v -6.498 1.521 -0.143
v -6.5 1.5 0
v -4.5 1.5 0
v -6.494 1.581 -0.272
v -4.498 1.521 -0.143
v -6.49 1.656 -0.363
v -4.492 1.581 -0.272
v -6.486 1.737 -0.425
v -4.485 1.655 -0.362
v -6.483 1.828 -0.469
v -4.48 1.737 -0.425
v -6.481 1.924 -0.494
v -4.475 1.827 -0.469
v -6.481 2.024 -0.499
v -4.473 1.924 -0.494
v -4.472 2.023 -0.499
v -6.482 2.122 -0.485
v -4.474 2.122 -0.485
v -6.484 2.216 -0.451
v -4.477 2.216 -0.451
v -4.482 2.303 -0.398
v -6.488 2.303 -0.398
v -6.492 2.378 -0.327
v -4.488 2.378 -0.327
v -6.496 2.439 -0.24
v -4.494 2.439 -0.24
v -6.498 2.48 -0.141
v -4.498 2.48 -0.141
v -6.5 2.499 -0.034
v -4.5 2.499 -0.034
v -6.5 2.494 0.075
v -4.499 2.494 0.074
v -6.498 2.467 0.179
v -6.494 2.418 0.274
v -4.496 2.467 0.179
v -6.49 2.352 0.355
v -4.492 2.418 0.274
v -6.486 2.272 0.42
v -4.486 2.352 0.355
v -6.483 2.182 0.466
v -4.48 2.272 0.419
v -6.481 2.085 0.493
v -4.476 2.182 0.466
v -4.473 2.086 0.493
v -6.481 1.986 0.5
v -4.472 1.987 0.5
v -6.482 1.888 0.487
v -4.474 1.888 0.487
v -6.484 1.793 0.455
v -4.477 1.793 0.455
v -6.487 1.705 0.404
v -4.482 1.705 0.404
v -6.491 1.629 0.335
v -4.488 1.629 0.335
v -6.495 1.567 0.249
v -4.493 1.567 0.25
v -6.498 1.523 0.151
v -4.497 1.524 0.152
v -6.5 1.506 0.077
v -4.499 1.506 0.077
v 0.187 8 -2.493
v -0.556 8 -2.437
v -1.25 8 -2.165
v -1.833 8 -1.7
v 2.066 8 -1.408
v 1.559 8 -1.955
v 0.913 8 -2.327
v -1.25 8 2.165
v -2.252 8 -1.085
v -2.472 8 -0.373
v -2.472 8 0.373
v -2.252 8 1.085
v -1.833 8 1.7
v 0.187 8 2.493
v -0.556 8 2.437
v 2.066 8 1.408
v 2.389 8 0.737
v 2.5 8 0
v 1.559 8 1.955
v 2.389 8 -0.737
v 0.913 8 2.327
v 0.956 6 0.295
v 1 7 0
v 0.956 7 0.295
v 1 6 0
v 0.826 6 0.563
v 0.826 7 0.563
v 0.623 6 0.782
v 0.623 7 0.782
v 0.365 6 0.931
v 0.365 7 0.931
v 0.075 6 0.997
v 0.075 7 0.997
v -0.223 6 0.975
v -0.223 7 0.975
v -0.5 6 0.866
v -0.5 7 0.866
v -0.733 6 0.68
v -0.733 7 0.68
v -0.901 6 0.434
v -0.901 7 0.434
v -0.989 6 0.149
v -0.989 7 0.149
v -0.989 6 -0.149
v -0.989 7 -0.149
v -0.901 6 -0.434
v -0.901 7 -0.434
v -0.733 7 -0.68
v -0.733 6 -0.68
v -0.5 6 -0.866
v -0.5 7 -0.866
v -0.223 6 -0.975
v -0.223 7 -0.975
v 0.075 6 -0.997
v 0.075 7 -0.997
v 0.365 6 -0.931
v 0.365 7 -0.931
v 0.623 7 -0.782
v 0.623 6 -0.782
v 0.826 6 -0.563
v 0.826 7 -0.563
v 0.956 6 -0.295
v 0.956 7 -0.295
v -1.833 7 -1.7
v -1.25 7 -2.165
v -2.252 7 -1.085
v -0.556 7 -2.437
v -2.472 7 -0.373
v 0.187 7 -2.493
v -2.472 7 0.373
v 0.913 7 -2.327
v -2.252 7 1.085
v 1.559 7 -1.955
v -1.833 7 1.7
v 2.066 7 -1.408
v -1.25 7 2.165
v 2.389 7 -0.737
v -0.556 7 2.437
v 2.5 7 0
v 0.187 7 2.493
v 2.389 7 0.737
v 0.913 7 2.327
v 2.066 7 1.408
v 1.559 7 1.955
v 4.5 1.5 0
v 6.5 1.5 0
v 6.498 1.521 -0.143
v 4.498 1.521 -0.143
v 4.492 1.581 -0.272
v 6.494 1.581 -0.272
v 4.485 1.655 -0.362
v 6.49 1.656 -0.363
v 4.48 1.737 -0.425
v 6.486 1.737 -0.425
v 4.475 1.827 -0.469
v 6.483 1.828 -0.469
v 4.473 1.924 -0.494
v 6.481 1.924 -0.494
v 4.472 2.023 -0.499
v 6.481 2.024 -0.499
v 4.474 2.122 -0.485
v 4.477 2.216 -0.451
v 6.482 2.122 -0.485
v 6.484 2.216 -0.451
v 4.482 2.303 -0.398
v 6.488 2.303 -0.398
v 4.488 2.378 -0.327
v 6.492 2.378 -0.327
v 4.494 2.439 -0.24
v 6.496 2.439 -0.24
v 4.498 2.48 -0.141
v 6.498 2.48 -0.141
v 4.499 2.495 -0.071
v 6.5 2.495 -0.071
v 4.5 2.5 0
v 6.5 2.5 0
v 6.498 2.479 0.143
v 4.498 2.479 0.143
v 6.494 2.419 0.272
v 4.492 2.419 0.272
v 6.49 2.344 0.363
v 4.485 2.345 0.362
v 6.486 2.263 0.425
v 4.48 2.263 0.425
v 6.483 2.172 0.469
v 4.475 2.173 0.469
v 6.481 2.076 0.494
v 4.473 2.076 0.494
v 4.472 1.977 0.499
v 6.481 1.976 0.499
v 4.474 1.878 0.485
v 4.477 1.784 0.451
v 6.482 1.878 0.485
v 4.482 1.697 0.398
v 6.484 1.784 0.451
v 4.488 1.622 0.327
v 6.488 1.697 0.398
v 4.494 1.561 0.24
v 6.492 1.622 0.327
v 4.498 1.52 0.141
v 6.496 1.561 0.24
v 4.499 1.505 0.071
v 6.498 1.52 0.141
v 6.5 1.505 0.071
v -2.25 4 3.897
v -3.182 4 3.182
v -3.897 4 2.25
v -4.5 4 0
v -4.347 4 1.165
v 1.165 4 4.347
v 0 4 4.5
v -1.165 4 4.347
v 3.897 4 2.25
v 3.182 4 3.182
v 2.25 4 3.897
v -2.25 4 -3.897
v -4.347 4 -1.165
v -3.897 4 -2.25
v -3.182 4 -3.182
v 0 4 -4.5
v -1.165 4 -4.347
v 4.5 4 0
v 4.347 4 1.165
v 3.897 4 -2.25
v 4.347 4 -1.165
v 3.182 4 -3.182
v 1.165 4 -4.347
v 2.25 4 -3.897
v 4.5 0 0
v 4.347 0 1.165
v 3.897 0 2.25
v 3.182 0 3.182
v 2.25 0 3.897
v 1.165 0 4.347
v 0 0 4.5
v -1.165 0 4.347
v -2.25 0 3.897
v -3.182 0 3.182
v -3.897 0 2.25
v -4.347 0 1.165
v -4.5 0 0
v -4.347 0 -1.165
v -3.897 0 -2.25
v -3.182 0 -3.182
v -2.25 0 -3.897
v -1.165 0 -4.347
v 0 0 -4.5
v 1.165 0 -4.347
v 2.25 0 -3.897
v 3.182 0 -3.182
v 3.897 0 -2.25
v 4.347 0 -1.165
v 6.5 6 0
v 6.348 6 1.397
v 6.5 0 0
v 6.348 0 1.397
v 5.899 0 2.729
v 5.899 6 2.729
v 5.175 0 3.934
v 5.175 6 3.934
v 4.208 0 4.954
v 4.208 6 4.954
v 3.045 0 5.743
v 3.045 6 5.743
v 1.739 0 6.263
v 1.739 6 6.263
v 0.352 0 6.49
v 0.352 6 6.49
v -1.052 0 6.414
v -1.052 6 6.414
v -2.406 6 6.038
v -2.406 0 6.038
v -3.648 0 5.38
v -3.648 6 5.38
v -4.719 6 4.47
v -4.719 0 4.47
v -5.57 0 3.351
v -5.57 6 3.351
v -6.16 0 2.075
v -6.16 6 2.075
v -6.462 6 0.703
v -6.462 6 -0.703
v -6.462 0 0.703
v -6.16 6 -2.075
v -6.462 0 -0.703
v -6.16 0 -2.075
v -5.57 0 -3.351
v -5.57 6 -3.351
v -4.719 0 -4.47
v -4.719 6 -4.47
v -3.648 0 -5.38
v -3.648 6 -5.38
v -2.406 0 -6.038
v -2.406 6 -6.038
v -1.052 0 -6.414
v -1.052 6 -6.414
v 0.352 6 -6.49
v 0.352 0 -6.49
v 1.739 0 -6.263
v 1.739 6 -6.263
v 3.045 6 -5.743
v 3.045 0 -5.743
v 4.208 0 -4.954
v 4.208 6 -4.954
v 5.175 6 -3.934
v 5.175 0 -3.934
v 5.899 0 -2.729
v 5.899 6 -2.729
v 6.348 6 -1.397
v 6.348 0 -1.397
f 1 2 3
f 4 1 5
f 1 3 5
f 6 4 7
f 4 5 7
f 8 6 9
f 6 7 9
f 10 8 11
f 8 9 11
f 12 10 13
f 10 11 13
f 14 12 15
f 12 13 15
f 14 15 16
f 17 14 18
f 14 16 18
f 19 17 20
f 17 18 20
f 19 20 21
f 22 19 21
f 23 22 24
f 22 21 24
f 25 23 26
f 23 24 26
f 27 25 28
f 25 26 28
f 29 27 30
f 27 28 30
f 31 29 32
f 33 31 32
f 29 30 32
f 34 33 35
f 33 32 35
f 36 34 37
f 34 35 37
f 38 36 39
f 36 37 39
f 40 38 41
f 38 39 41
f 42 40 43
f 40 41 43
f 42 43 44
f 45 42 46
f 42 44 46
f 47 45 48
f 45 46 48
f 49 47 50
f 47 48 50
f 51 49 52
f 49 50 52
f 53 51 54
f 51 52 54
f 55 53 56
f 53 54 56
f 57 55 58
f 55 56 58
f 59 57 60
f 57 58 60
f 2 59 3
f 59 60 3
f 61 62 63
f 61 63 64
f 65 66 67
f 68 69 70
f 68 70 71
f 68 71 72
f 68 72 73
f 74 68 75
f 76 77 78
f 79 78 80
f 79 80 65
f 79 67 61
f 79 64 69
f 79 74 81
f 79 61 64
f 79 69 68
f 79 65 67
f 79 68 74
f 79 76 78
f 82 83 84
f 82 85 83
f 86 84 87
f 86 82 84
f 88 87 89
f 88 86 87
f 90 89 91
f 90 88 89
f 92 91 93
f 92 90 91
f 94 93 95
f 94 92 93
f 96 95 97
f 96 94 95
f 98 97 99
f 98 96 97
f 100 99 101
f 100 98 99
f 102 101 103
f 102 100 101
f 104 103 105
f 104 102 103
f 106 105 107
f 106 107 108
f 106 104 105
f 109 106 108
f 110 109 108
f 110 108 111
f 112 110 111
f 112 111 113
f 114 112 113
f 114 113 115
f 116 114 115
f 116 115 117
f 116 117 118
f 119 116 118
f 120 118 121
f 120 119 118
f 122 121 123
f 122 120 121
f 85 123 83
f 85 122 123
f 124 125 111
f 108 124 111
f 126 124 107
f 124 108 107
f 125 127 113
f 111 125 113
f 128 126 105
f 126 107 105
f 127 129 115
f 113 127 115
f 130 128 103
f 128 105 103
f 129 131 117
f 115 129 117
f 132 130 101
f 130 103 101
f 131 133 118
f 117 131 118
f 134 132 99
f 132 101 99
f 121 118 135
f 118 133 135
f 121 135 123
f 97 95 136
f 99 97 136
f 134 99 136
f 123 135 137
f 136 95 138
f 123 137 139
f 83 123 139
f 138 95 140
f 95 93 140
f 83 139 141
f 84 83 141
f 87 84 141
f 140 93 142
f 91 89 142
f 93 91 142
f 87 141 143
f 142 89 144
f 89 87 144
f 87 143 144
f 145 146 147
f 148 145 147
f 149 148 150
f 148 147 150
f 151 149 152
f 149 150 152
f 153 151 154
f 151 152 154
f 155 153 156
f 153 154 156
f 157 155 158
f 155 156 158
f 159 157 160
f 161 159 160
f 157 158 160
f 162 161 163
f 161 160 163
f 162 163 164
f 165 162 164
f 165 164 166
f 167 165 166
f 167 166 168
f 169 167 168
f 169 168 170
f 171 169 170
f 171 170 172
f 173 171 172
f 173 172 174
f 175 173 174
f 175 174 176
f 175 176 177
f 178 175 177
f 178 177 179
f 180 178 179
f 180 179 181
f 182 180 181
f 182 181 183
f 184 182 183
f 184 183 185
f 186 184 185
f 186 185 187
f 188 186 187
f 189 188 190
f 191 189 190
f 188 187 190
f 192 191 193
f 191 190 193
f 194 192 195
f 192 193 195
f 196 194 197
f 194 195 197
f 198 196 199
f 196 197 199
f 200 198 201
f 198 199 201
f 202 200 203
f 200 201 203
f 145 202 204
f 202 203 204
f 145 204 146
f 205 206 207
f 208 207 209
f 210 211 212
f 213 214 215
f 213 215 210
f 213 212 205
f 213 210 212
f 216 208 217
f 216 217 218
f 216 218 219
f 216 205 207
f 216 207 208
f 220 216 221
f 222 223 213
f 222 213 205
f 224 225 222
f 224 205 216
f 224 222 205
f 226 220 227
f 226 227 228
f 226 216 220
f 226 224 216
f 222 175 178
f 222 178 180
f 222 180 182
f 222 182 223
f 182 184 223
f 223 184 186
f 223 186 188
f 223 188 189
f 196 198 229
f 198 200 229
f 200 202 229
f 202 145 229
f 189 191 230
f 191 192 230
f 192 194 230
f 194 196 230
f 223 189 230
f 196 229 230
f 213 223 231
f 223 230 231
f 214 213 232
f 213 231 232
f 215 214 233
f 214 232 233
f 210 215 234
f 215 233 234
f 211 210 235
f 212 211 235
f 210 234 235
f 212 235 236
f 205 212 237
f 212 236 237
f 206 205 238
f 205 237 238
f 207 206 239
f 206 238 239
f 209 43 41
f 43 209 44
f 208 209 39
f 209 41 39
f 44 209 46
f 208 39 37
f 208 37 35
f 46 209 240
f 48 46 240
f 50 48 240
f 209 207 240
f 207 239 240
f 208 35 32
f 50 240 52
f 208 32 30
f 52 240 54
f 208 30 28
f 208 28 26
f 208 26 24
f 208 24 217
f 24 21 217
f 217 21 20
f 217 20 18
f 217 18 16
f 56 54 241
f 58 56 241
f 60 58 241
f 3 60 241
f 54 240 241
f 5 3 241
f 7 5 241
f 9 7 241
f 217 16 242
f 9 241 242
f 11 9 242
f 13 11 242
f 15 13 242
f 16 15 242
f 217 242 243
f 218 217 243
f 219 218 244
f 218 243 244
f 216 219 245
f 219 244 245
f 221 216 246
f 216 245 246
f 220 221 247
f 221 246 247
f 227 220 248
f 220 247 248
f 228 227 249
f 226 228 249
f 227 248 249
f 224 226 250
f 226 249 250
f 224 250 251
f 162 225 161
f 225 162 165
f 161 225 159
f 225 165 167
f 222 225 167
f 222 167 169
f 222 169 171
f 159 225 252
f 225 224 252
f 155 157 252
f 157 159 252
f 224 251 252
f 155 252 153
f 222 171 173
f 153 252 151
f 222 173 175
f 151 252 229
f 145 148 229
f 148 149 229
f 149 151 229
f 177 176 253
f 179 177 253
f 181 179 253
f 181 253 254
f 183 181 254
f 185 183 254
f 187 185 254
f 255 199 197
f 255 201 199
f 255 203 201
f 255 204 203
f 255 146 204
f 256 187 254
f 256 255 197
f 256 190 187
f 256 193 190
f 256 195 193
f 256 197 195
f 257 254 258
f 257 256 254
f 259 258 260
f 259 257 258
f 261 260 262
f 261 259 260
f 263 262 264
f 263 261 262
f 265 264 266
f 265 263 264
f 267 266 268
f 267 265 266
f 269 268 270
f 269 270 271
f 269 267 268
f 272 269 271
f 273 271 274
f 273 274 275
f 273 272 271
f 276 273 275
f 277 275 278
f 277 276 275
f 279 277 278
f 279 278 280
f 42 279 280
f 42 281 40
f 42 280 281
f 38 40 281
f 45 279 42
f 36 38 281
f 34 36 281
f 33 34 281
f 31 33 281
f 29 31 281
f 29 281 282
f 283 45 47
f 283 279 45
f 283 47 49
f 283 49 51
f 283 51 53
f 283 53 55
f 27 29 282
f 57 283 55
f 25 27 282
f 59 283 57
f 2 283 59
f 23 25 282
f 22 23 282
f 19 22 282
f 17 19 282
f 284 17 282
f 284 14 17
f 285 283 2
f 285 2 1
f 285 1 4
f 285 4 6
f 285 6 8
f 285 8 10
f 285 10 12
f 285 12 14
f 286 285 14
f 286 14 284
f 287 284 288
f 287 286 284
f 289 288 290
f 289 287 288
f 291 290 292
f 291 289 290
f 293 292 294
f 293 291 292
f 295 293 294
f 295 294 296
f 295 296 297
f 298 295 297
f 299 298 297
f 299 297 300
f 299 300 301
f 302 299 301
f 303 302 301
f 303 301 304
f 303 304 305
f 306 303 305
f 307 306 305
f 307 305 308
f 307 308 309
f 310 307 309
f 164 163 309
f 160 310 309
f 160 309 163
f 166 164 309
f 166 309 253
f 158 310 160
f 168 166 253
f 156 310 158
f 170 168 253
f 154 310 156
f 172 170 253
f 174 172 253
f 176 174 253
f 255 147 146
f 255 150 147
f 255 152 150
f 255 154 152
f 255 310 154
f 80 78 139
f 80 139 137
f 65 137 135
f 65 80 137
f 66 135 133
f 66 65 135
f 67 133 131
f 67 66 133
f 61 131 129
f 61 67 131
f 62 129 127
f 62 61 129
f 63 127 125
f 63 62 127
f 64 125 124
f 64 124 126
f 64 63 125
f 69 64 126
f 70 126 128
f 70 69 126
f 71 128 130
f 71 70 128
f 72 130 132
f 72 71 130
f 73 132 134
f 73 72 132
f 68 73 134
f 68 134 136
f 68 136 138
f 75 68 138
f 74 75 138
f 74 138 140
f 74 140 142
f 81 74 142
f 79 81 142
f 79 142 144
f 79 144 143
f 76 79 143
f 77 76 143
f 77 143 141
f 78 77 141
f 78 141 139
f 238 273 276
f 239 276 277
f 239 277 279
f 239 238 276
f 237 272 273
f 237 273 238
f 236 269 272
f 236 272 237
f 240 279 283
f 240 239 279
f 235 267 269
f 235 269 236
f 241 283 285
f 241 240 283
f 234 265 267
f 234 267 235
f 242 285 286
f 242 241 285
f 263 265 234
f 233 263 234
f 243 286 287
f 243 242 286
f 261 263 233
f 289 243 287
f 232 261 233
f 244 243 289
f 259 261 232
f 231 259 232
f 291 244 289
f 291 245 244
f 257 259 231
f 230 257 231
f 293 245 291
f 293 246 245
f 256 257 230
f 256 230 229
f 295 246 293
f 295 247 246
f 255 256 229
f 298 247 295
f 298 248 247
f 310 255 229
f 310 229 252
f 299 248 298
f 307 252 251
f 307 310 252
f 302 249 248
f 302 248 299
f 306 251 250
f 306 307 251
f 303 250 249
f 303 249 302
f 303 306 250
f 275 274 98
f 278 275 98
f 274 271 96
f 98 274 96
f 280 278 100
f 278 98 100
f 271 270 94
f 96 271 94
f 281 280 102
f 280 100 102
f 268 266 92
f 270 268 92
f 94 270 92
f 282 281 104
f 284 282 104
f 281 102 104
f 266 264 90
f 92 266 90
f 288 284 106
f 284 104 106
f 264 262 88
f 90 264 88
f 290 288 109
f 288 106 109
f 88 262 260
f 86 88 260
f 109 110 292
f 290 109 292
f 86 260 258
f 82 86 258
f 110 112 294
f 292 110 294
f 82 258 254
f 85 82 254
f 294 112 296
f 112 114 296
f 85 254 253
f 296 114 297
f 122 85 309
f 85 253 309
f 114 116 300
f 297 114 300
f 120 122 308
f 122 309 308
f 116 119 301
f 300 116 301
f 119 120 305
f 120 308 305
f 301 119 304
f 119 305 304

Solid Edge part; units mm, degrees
sketch "Sketch1" plane through (0, 0, 0) normal (0, -1, 0) x (1, 0, 0)
  circle A0 centre (0, 0) radius 6.5
extrude "Protrusion1" add sketch "Sketch1" against normal blind 6
sketch "Sketch2" plane through (0, 0, 0) normal (0, -1, 0) x (1, 0, 0)
  circle A0 centre (0, 0) radius 4.5
extrude "ExtrudedCutout_1" cut sketch "Sketch2" against normal blind 4
sketch "Sketch3" plane through (6.5, 3, 0) normal (1, 0, 0) x (0, -1, 0)
  circle A0 centre (1, 0) radius 0.5
extrude "ExtrudedCutout_2" cut sketch "Sketch3" against normal blind 17.8502
sketch "Sketch4" plane through (0, 6, 0) normal (0, 1, 0) x (1, 0, 0)
  circle A0 centre (0, 0) radius 1
extrude "ExtrudedProtrusion_2" add sketch "Sketch4" along normal blind 2
sketch "Sketch5" plane through (0, 8, 0) normal (0, 1, 0) x (1, 0, 0)
  circle A0 centre (0, 0) radius 2.5
extrude "ExtrudedProtrusion_3" add sketch "Sketch5" against normal blind 1
